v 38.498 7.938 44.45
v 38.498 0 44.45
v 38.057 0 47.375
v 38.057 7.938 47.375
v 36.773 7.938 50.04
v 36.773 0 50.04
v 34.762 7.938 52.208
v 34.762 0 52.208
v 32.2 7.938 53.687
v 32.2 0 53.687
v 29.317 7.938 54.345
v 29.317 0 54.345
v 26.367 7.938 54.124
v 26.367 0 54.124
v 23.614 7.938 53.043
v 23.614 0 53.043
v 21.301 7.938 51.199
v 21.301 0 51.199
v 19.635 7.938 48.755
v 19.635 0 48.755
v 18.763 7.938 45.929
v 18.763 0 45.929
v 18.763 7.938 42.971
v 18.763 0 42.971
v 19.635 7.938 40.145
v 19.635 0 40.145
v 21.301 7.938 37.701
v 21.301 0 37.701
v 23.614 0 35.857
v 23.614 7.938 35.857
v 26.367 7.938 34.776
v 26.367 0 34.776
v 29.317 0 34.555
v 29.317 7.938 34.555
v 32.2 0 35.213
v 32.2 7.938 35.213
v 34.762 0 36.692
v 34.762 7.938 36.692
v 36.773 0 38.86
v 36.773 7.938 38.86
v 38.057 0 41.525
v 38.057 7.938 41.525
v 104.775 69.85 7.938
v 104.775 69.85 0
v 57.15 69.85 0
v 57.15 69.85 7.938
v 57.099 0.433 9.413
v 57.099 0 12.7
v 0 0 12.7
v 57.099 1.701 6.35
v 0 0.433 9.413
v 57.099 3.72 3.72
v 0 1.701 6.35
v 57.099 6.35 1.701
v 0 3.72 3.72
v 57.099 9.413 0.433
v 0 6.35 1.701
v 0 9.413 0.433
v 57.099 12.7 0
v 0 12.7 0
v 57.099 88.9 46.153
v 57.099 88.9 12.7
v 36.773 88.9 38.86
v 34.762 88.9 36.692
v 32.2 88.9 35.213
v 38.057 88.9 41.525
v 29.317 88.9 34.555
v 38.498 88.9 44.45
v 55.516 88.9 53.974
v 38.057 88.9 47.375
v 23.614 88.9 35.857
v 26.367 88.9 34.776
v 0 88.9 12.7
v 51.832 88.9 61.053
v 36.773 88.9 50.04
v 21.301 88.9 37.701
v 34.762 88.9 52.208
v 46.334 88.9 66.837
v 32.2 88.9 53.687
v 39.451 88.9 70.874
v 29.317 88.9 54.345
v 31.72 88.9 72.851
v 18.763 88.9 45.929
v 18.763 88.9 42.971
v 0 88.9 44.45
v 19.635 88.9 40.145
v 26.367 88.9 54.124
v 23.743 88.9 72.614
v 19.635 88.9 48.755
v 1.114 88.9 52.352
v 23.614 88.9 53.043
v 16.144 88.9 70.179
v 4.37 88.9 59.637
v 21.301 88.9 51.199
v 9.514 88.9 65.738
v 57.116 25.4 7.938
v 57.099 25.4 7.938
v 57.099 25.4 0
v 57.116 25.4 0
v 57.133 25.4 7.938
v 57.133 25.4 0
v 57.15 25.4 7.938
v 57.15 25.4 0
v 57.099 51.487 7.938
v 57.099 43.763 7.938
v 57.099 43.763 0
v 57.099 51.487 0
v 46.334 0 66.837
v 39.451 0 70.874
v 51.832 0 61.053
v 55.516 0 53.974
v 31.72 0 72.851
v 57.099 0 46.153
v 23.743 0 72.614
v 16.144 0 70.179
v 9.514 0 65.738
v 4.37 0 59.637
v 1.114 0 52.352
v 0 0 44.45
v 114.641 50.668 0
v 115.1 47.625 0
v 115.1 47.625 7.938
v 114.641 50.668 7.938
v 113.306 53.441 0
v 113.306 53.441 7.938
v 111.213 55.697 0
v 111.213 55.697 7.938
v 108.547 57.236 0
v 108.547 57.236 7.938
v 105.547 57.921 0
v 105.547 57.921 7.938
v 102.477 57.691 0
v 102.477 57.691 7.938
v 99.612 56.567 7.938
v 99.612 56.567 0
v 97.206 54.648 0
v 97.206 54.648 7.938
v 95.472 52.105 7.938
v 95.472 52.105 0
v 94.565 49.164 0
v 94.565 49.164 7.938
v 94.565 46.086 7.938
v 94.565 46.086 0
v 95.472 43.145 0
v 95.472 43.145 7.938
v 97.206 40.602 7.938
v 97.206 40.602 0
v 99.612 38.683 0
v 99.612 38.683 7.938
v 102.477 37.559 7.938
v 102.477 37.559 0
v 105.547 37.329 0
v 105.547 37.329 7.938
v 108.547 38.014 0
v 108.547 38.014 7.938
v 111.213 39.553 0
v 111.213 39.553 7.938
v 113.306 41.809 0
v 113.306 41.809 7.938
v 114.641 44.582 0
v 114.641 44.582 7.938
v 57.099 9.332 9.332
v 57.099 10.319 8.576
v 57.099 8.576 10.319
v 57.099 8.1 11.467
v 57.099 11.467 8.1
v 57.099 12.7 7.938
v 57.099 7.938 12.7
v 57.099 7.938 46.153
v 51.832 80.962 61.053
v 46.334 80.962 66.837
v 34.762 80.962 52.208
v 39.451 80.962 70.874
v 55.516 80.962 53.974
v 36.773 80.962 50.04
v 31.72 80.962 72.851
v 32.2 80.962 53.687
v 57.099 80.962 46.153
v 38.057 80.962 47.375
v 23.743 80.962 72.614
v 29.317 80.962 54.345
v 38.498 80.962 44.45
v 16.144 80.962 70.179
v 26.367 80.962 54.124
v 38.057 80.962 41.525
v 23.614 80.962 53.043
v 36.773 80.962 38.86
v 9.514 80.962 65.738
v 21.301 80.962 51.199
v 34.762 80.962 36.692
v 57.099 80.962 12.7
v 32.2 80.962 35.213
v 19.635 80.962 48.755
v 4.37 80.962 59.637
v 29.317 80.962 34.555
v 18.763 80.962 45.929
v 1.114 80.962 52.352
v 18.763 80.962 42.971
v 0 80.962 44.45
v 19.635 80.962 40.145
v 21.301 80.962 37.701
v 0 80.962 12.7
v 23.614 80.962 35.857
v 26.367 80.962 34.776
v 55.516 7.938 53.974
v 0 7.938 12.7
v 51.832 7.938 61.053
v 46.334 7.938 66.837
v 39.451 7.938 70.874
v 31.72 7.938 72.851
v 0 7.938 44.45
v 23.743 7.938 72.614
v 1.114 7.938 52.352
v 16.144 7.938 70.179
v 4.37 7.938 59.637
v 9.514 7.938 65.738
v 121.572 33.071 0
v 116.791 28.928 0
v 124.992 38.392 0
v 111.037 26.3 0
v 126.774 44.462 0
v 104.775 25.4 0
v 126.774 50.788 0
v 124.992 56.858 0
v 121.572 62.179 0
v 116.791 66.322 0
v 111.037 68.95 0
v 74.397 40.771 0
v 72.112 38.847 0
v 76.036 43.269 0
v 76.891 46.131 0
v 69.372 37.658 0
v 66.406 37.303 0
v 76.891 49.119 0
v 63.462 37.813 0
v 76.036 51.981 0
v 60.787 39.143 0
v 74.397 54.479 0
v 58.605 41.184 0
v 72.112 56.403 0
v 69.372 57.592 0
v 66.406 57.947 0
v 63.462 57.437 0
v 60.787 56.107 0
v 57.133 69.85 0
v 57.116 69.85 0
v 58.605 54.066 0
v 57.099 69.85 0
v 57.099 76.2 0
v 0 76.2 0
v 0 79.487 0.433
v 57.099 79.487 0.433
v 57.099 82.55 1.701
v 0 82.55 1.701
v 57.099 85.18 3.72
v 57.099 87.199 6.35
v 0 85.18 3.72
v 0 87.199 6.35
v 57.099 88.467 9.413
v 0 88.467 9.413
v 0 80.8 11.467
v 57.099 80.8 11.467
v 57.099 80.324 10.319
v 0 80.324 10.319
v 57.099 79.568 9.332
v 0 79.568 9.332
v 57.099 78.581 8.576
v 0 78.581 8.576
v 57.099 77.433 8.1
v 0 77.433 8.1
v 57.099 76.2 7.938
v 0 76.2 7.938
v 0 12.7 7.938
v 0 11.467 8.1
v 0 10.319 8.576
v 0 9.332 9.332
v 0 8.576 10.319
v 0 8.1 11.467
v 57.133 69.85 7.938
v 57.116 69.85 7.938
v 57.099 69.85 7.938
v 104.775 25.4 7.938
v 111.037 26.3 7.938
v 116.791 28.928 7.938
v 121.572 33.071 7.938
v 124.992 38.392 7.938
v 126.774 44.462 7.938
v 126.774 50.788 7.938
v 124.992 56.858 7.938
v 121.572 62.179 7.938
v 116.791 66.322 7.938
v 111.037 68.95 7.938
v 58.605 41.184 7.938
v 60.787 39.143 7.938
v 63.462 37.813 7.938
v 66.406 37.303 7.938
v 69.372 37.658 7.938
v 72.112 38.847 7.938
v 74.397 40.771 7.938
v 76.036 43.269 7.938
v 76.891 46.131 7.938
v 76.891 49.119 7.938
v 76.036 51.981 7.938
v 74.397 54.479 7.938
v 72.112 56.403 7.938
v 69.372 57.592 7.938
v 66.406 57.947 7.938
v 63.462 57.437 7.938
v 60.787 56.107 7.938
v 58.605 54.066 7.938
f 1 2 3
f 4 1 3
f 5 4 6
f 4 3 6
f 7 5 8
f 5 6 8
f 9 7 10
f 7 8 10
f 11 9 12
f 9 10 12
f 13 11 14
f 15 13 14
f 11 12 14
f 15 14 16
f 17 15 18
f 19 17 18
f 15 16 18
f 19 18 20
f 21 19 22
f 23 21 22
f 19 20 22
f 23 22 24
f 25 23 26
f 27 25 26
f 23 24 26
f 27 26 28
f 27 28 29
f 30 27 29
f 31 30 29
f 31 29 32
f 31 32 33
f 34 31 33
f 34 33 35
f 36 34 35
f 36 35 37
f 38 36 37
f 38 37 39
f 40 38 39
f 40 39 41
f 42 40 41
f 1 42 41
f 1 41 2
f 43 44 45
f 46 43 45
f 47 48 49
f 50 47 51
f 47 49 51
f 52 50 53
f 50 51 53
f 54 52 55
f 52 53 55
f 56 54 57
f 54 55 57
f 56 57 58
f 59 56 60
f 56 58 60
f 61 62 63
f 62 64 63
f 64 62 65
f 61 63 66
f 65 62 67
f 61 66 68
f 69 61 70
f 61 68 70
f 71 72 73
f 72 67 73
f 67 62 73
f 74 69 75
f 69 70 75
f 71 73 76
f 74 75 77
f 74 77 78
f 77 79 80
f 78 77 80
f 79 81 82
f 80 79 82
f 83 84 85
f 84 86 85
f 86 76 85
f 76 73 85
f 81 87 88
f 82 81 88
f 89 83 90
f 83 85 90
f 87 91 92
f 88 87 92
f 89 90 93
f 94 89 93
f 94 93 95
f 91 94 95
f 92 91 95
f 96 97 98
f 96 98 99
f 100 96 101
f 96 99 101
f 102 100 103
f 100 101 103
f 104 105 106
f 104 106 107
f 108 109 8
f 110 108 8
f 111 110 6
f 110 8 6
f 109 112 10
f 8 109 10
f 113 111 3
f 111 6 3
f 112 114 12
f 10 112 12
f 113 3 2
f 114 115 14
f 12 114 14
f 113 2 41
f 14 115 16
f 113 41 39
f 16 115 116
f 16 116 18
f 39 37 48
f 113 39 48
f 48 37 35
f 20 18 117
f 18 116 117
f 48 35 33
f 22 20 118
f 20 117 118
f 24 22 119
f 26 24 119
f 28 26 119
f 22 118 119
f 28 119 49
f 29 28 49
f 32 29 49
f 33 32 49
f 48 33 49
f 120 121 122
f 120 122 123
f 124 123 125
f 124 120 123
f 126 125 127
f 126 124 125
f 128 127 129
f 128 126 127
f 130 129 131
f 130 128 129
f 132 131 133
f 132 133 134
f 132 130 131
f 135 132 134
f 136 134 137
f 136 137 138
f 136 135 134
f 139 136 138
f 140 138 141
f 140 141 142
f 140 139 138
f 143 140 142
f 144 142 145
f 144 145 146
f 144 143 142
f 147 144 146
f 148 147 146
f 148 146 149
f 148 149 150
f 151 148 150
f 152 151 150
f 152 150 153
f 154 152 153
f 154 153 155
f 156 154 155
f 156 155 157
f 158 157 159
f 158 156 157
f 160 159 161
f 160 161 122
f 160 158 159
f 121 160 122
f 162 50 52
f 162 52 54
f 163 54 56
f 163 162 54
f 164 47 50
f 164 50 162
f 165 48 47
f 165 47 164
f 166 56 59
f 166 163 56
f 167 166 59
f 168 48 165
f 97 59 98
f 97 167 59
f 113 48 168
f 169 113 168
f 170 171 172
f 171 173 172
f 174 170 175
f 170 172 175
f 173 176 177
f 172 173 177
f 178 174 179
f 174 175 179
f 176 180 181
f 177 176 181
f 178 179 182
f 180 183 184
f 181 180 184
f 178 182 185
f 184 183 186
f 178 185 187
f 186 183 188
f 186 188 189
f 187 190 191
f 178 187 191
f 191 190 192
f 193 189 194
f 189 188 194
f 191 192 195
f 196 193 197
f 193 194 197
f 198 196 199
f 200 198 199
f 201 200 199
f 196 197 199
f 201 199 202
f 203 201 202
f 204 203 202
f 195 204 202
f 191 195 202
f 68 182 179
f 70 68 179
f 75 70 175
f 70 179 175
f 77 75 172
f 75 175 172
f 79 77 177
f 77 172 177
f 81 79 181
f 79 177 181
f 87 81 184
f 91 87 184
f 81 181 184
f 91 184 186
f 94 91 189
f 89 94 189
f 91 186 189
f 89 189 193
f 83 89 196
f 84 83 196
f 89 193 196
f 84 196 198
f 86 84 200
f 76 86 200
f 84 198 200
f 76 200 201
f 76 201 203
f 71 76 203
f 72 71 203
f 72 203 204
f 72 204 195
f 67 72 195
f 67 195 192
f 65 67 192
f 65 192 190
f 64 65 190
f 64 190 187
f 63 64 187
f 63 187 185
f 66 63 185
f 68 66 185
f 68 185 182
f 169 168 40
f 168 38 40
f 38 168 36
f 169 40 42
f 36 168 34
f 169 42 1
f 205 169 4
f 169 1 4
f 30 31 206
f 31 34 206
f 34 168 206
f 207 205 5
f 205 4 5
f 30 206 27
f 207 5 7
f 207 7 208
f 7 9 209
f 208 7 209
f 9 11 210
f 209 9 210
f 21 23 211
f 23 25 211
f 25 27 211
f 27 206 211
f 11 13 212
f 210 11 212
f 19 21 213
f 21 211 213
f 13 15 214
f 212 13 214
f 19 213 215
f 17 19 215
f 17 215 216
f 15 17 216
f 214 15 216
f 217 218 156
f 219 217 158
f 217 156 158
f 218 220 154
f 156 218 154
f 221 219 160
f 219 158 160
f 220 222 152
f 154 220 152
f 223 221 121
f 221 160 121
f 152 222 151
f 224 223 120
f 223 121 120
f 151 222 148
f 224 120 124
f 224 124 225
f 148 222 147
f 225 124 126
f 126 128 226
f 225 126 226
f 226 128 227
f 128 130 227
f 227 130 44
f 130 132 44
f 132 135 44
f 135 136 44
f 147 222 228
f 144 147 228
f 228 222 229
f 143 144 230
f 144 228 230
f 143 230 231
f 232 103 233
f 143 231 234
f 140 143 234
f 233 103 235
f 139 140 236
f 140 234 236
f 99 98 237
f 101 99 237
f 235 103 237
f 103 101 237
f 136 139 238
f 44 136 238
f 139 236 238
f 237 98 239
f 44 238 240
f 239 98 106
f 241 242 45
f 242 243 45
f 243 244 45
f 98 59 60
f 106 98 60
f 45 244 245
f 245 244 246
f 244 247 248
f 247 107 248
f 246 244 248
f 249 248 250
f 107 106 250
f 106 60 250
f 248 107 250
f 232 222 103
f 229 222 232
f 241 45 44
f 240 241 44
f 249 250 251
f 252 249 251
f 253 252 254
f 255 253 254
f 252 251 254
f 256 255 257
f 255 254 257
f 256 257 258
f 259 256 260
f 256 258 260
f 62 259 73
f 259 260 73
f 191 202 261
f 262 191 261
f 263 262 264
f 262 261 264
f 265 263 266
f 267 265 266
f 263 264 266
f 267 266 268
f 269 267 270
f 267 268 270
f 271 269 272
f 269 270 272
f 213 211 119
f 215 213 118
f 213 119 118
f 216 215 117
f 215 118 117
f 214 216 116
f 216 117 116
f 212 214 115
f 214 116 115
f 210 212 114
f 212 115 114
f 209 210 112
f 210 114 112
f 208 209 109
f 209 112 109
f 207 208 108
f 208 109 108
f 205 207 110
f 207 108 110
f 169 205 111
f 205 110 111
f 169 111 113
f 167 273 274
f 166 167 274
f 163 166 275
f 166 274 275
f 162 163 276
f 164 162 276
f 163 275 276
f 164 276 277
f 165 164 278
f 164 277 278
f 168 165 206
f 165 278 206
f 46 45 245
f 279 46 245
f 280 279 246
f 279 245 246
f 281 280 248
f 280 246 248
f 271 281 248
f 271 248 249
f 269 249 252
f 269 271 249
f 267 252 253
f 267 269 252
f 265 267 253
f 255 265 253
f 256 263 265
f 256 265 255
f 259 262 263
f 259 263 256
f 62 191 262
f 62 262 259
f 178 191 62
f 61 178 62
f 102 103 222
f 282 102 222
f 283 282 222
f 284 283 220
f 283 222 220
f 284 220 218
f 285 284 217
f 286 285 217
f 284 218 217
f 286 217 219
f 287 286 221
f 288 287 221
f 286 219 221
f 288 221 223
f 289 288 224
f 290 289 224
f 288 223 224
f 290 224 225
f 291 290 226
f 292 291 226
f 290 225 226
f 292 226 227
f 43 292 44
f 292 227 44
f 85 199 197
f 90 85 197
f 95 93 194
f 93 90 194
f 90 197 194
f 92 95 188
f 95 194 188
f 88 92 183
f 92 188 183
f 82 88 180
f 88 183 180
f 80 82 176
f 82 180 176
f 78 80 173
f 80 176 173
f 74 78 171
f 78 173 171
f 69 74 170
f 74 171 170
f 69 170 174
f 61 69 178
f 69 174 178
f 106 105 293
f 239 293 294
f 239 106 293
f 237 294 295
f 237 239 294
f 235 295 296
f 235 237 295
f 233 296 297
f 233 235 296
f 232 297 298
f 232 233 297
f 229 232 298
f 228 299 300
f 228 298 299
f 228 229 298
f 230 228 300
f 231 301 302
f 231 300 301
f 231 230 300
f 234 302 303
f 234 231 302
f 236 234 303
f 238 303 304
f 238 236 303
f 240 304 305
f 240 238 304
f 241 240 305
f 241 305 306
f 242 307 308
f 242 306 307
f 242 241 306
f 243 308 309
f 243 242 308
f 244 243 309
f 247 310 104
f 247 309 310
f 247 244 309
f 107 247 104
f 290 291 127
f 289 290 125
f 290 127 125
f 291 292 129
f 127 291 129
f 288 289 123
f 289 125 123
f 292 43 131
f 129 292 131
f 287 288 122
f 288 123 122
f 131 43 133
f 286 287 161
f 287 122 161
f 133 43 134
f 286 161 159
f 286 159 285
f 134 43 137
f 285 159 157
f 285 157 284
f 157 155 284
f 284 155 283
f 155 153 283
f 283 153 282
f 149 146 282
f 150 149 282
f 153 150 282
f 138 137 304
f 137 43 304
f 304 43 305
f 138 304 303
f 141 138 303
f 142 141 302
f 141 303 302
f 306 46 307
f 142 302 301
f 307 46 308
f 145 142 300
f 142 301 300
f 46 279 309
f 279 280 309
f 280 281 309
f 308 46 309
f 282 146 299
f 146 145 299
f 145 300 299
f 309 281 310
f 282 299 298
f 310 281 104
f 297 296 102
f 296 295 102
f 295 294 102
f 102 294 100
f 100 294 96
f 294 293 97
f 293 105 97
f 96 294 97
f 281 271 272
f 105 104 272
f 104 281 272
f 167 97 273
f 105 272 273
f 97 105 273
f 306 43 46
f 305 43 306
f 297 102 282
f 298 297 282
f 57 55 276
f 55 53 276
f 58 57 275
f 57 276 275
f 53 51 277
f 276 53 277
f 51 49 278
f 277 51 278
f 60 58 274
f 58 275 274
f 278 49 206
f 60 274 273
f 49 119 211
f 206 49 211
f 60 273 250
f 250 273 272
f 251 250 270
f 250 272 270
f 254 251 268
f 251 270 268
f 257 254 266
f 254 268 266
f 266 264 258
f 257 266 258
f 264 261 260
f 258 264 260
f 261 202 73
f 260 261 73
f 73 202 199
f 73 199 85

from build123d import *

# Parameters (mm, degrees)
F0_R     = 10.3251
F1_DEPTH = 7.9375
F3_DEPTH = 57.0992
F4_R     = 9.92251
F5_DEPTH = 88.901
F7_DEPTH = 127.001


with BuildPart() as f1:
    # F0 (on Top) → F1 (new body)
    with BuildSketch(Plane.XY):
        with BuildLine():
            Line((0, 88.9), (0, 0))
            Line((0, 0), (50.8, 0))
            Line((50.8, 0), (50.8, 19.05))
            ThreePointArc((50.8, 19.05), (52.6598719395, 23.5401280605), (57.15, 25.4))
            Line((57.15, 25.4), (104.775, 25.4))
            ThreePointArc((104.775, 25.4), (127, 47.625), (104.775, 69.85))
            Line((104.775, 69.85), (57.15, 69.85))
            ThreePointArc((57.15, 69.85), (52.6598719395, 71.7098719395), (50.8, 76.2))
            Line((50.8, 76.2), (50.8, 88.9))
            Line((50.8, 88.9), (0, 88.9))
        make_face()
        with Locations((66.675, 47.625)):
            Circle(F0_R, mode=Mode.SUBTRACT)
        with Locations((104.775, 47.625)):
            Circle(F0_R, mode=Mode.SUBTRACT)
    extrude(amount=F1_DEPTH)

    # F2 (on Right) → F3 (join)
    with BuildSketch(Plane.YZ):
        with BuildLine():
            Line((0, 76.2), (0, 12.7))
            ThreePointArc((0, 12.7), (3.7197438789, 3.7197438789), (12.7, 0))
            Line((12.7, 0), (76.2, 0))
            ThreePointArc((76.2, 0), (85.1802561211, 3.7197438789), (88.9, 12.7))
            Line((88.9, 12.7), (88.9, 76.2))
            Line((88.9, 76.2), (80.9625, 76.2))
            Line((80.9625, 76.2), (80.9625, 12.7))
            ThreePointArc((80.9625, 12.7), (79.5675960454, 9.3324039546), (76.2, 7.9375))
            Line((76.2, 7.9375), (12.7, 7.9375))
            ThreePointArc((12.7, 7.9375), (9.3324039546, 9.3324039546), (7.9375, 12.7))
            Line((7.9375, 12.7), (7.9375, 76.2))
            Line((7.9375, 76.2), (0, 76.2))
        make_face()
    extrude(amount=F3_DEPTH)

    # F4 (on Front) → F5 (cut, through all)
    with BuildSketch(Plane.XZ):
        with Locations((28.575, 44.45)):
            Circle(F4_R)
        with BuildLine():
            Line((57.1075950167, 46.0061640709), (57.1084559489, 42.9097024275))
            ThreePointArc((57.1084559489, 42.9097024275), (57.1499988955, 44.4579449194), (57.1075950167, 46.0061640709))
        make_face()
        with BuildLine():
            ThreePointArc((0, 44.45), (27.7966291375, 73.0143967869), (57.1075950167, 46.0061640709))
            Line((57.1075950167, 46.0061640709), (57.0992, 76.2))
            Line((57.0992, 76.2), (0, 76.2))
            Line((0, 76.2), (0, 44.45))
        make_face()
    extrude(amount=-F5_DEPTH, mode=Mode.SUBTRACT)

    # F6 (on Right) → F7 (cut, through all)
    with BuildSketch(Plane.YZ):
        with BuildLine():
            Line((0, 12.7), (0, 0))
            Line((0, 0), (12.7, 0))
            ThreePointArc((12.7, 0), (3.7197438789, 3.7197438789), (0, 12.7))
        make_face()
        with BuildLine():
            Line((76.2, 0), (88.9, 0))
            Line((88.9, 0), (88.9, 12.7))
            ThreePointArc((88.9, 12.7), (85.1802561211, 3.7197438789), (76.2, 0))
        make_face()
    extrude(amount=F7_DEPTH, mode=Mode.SUBTRACT)


solid = f1.part
